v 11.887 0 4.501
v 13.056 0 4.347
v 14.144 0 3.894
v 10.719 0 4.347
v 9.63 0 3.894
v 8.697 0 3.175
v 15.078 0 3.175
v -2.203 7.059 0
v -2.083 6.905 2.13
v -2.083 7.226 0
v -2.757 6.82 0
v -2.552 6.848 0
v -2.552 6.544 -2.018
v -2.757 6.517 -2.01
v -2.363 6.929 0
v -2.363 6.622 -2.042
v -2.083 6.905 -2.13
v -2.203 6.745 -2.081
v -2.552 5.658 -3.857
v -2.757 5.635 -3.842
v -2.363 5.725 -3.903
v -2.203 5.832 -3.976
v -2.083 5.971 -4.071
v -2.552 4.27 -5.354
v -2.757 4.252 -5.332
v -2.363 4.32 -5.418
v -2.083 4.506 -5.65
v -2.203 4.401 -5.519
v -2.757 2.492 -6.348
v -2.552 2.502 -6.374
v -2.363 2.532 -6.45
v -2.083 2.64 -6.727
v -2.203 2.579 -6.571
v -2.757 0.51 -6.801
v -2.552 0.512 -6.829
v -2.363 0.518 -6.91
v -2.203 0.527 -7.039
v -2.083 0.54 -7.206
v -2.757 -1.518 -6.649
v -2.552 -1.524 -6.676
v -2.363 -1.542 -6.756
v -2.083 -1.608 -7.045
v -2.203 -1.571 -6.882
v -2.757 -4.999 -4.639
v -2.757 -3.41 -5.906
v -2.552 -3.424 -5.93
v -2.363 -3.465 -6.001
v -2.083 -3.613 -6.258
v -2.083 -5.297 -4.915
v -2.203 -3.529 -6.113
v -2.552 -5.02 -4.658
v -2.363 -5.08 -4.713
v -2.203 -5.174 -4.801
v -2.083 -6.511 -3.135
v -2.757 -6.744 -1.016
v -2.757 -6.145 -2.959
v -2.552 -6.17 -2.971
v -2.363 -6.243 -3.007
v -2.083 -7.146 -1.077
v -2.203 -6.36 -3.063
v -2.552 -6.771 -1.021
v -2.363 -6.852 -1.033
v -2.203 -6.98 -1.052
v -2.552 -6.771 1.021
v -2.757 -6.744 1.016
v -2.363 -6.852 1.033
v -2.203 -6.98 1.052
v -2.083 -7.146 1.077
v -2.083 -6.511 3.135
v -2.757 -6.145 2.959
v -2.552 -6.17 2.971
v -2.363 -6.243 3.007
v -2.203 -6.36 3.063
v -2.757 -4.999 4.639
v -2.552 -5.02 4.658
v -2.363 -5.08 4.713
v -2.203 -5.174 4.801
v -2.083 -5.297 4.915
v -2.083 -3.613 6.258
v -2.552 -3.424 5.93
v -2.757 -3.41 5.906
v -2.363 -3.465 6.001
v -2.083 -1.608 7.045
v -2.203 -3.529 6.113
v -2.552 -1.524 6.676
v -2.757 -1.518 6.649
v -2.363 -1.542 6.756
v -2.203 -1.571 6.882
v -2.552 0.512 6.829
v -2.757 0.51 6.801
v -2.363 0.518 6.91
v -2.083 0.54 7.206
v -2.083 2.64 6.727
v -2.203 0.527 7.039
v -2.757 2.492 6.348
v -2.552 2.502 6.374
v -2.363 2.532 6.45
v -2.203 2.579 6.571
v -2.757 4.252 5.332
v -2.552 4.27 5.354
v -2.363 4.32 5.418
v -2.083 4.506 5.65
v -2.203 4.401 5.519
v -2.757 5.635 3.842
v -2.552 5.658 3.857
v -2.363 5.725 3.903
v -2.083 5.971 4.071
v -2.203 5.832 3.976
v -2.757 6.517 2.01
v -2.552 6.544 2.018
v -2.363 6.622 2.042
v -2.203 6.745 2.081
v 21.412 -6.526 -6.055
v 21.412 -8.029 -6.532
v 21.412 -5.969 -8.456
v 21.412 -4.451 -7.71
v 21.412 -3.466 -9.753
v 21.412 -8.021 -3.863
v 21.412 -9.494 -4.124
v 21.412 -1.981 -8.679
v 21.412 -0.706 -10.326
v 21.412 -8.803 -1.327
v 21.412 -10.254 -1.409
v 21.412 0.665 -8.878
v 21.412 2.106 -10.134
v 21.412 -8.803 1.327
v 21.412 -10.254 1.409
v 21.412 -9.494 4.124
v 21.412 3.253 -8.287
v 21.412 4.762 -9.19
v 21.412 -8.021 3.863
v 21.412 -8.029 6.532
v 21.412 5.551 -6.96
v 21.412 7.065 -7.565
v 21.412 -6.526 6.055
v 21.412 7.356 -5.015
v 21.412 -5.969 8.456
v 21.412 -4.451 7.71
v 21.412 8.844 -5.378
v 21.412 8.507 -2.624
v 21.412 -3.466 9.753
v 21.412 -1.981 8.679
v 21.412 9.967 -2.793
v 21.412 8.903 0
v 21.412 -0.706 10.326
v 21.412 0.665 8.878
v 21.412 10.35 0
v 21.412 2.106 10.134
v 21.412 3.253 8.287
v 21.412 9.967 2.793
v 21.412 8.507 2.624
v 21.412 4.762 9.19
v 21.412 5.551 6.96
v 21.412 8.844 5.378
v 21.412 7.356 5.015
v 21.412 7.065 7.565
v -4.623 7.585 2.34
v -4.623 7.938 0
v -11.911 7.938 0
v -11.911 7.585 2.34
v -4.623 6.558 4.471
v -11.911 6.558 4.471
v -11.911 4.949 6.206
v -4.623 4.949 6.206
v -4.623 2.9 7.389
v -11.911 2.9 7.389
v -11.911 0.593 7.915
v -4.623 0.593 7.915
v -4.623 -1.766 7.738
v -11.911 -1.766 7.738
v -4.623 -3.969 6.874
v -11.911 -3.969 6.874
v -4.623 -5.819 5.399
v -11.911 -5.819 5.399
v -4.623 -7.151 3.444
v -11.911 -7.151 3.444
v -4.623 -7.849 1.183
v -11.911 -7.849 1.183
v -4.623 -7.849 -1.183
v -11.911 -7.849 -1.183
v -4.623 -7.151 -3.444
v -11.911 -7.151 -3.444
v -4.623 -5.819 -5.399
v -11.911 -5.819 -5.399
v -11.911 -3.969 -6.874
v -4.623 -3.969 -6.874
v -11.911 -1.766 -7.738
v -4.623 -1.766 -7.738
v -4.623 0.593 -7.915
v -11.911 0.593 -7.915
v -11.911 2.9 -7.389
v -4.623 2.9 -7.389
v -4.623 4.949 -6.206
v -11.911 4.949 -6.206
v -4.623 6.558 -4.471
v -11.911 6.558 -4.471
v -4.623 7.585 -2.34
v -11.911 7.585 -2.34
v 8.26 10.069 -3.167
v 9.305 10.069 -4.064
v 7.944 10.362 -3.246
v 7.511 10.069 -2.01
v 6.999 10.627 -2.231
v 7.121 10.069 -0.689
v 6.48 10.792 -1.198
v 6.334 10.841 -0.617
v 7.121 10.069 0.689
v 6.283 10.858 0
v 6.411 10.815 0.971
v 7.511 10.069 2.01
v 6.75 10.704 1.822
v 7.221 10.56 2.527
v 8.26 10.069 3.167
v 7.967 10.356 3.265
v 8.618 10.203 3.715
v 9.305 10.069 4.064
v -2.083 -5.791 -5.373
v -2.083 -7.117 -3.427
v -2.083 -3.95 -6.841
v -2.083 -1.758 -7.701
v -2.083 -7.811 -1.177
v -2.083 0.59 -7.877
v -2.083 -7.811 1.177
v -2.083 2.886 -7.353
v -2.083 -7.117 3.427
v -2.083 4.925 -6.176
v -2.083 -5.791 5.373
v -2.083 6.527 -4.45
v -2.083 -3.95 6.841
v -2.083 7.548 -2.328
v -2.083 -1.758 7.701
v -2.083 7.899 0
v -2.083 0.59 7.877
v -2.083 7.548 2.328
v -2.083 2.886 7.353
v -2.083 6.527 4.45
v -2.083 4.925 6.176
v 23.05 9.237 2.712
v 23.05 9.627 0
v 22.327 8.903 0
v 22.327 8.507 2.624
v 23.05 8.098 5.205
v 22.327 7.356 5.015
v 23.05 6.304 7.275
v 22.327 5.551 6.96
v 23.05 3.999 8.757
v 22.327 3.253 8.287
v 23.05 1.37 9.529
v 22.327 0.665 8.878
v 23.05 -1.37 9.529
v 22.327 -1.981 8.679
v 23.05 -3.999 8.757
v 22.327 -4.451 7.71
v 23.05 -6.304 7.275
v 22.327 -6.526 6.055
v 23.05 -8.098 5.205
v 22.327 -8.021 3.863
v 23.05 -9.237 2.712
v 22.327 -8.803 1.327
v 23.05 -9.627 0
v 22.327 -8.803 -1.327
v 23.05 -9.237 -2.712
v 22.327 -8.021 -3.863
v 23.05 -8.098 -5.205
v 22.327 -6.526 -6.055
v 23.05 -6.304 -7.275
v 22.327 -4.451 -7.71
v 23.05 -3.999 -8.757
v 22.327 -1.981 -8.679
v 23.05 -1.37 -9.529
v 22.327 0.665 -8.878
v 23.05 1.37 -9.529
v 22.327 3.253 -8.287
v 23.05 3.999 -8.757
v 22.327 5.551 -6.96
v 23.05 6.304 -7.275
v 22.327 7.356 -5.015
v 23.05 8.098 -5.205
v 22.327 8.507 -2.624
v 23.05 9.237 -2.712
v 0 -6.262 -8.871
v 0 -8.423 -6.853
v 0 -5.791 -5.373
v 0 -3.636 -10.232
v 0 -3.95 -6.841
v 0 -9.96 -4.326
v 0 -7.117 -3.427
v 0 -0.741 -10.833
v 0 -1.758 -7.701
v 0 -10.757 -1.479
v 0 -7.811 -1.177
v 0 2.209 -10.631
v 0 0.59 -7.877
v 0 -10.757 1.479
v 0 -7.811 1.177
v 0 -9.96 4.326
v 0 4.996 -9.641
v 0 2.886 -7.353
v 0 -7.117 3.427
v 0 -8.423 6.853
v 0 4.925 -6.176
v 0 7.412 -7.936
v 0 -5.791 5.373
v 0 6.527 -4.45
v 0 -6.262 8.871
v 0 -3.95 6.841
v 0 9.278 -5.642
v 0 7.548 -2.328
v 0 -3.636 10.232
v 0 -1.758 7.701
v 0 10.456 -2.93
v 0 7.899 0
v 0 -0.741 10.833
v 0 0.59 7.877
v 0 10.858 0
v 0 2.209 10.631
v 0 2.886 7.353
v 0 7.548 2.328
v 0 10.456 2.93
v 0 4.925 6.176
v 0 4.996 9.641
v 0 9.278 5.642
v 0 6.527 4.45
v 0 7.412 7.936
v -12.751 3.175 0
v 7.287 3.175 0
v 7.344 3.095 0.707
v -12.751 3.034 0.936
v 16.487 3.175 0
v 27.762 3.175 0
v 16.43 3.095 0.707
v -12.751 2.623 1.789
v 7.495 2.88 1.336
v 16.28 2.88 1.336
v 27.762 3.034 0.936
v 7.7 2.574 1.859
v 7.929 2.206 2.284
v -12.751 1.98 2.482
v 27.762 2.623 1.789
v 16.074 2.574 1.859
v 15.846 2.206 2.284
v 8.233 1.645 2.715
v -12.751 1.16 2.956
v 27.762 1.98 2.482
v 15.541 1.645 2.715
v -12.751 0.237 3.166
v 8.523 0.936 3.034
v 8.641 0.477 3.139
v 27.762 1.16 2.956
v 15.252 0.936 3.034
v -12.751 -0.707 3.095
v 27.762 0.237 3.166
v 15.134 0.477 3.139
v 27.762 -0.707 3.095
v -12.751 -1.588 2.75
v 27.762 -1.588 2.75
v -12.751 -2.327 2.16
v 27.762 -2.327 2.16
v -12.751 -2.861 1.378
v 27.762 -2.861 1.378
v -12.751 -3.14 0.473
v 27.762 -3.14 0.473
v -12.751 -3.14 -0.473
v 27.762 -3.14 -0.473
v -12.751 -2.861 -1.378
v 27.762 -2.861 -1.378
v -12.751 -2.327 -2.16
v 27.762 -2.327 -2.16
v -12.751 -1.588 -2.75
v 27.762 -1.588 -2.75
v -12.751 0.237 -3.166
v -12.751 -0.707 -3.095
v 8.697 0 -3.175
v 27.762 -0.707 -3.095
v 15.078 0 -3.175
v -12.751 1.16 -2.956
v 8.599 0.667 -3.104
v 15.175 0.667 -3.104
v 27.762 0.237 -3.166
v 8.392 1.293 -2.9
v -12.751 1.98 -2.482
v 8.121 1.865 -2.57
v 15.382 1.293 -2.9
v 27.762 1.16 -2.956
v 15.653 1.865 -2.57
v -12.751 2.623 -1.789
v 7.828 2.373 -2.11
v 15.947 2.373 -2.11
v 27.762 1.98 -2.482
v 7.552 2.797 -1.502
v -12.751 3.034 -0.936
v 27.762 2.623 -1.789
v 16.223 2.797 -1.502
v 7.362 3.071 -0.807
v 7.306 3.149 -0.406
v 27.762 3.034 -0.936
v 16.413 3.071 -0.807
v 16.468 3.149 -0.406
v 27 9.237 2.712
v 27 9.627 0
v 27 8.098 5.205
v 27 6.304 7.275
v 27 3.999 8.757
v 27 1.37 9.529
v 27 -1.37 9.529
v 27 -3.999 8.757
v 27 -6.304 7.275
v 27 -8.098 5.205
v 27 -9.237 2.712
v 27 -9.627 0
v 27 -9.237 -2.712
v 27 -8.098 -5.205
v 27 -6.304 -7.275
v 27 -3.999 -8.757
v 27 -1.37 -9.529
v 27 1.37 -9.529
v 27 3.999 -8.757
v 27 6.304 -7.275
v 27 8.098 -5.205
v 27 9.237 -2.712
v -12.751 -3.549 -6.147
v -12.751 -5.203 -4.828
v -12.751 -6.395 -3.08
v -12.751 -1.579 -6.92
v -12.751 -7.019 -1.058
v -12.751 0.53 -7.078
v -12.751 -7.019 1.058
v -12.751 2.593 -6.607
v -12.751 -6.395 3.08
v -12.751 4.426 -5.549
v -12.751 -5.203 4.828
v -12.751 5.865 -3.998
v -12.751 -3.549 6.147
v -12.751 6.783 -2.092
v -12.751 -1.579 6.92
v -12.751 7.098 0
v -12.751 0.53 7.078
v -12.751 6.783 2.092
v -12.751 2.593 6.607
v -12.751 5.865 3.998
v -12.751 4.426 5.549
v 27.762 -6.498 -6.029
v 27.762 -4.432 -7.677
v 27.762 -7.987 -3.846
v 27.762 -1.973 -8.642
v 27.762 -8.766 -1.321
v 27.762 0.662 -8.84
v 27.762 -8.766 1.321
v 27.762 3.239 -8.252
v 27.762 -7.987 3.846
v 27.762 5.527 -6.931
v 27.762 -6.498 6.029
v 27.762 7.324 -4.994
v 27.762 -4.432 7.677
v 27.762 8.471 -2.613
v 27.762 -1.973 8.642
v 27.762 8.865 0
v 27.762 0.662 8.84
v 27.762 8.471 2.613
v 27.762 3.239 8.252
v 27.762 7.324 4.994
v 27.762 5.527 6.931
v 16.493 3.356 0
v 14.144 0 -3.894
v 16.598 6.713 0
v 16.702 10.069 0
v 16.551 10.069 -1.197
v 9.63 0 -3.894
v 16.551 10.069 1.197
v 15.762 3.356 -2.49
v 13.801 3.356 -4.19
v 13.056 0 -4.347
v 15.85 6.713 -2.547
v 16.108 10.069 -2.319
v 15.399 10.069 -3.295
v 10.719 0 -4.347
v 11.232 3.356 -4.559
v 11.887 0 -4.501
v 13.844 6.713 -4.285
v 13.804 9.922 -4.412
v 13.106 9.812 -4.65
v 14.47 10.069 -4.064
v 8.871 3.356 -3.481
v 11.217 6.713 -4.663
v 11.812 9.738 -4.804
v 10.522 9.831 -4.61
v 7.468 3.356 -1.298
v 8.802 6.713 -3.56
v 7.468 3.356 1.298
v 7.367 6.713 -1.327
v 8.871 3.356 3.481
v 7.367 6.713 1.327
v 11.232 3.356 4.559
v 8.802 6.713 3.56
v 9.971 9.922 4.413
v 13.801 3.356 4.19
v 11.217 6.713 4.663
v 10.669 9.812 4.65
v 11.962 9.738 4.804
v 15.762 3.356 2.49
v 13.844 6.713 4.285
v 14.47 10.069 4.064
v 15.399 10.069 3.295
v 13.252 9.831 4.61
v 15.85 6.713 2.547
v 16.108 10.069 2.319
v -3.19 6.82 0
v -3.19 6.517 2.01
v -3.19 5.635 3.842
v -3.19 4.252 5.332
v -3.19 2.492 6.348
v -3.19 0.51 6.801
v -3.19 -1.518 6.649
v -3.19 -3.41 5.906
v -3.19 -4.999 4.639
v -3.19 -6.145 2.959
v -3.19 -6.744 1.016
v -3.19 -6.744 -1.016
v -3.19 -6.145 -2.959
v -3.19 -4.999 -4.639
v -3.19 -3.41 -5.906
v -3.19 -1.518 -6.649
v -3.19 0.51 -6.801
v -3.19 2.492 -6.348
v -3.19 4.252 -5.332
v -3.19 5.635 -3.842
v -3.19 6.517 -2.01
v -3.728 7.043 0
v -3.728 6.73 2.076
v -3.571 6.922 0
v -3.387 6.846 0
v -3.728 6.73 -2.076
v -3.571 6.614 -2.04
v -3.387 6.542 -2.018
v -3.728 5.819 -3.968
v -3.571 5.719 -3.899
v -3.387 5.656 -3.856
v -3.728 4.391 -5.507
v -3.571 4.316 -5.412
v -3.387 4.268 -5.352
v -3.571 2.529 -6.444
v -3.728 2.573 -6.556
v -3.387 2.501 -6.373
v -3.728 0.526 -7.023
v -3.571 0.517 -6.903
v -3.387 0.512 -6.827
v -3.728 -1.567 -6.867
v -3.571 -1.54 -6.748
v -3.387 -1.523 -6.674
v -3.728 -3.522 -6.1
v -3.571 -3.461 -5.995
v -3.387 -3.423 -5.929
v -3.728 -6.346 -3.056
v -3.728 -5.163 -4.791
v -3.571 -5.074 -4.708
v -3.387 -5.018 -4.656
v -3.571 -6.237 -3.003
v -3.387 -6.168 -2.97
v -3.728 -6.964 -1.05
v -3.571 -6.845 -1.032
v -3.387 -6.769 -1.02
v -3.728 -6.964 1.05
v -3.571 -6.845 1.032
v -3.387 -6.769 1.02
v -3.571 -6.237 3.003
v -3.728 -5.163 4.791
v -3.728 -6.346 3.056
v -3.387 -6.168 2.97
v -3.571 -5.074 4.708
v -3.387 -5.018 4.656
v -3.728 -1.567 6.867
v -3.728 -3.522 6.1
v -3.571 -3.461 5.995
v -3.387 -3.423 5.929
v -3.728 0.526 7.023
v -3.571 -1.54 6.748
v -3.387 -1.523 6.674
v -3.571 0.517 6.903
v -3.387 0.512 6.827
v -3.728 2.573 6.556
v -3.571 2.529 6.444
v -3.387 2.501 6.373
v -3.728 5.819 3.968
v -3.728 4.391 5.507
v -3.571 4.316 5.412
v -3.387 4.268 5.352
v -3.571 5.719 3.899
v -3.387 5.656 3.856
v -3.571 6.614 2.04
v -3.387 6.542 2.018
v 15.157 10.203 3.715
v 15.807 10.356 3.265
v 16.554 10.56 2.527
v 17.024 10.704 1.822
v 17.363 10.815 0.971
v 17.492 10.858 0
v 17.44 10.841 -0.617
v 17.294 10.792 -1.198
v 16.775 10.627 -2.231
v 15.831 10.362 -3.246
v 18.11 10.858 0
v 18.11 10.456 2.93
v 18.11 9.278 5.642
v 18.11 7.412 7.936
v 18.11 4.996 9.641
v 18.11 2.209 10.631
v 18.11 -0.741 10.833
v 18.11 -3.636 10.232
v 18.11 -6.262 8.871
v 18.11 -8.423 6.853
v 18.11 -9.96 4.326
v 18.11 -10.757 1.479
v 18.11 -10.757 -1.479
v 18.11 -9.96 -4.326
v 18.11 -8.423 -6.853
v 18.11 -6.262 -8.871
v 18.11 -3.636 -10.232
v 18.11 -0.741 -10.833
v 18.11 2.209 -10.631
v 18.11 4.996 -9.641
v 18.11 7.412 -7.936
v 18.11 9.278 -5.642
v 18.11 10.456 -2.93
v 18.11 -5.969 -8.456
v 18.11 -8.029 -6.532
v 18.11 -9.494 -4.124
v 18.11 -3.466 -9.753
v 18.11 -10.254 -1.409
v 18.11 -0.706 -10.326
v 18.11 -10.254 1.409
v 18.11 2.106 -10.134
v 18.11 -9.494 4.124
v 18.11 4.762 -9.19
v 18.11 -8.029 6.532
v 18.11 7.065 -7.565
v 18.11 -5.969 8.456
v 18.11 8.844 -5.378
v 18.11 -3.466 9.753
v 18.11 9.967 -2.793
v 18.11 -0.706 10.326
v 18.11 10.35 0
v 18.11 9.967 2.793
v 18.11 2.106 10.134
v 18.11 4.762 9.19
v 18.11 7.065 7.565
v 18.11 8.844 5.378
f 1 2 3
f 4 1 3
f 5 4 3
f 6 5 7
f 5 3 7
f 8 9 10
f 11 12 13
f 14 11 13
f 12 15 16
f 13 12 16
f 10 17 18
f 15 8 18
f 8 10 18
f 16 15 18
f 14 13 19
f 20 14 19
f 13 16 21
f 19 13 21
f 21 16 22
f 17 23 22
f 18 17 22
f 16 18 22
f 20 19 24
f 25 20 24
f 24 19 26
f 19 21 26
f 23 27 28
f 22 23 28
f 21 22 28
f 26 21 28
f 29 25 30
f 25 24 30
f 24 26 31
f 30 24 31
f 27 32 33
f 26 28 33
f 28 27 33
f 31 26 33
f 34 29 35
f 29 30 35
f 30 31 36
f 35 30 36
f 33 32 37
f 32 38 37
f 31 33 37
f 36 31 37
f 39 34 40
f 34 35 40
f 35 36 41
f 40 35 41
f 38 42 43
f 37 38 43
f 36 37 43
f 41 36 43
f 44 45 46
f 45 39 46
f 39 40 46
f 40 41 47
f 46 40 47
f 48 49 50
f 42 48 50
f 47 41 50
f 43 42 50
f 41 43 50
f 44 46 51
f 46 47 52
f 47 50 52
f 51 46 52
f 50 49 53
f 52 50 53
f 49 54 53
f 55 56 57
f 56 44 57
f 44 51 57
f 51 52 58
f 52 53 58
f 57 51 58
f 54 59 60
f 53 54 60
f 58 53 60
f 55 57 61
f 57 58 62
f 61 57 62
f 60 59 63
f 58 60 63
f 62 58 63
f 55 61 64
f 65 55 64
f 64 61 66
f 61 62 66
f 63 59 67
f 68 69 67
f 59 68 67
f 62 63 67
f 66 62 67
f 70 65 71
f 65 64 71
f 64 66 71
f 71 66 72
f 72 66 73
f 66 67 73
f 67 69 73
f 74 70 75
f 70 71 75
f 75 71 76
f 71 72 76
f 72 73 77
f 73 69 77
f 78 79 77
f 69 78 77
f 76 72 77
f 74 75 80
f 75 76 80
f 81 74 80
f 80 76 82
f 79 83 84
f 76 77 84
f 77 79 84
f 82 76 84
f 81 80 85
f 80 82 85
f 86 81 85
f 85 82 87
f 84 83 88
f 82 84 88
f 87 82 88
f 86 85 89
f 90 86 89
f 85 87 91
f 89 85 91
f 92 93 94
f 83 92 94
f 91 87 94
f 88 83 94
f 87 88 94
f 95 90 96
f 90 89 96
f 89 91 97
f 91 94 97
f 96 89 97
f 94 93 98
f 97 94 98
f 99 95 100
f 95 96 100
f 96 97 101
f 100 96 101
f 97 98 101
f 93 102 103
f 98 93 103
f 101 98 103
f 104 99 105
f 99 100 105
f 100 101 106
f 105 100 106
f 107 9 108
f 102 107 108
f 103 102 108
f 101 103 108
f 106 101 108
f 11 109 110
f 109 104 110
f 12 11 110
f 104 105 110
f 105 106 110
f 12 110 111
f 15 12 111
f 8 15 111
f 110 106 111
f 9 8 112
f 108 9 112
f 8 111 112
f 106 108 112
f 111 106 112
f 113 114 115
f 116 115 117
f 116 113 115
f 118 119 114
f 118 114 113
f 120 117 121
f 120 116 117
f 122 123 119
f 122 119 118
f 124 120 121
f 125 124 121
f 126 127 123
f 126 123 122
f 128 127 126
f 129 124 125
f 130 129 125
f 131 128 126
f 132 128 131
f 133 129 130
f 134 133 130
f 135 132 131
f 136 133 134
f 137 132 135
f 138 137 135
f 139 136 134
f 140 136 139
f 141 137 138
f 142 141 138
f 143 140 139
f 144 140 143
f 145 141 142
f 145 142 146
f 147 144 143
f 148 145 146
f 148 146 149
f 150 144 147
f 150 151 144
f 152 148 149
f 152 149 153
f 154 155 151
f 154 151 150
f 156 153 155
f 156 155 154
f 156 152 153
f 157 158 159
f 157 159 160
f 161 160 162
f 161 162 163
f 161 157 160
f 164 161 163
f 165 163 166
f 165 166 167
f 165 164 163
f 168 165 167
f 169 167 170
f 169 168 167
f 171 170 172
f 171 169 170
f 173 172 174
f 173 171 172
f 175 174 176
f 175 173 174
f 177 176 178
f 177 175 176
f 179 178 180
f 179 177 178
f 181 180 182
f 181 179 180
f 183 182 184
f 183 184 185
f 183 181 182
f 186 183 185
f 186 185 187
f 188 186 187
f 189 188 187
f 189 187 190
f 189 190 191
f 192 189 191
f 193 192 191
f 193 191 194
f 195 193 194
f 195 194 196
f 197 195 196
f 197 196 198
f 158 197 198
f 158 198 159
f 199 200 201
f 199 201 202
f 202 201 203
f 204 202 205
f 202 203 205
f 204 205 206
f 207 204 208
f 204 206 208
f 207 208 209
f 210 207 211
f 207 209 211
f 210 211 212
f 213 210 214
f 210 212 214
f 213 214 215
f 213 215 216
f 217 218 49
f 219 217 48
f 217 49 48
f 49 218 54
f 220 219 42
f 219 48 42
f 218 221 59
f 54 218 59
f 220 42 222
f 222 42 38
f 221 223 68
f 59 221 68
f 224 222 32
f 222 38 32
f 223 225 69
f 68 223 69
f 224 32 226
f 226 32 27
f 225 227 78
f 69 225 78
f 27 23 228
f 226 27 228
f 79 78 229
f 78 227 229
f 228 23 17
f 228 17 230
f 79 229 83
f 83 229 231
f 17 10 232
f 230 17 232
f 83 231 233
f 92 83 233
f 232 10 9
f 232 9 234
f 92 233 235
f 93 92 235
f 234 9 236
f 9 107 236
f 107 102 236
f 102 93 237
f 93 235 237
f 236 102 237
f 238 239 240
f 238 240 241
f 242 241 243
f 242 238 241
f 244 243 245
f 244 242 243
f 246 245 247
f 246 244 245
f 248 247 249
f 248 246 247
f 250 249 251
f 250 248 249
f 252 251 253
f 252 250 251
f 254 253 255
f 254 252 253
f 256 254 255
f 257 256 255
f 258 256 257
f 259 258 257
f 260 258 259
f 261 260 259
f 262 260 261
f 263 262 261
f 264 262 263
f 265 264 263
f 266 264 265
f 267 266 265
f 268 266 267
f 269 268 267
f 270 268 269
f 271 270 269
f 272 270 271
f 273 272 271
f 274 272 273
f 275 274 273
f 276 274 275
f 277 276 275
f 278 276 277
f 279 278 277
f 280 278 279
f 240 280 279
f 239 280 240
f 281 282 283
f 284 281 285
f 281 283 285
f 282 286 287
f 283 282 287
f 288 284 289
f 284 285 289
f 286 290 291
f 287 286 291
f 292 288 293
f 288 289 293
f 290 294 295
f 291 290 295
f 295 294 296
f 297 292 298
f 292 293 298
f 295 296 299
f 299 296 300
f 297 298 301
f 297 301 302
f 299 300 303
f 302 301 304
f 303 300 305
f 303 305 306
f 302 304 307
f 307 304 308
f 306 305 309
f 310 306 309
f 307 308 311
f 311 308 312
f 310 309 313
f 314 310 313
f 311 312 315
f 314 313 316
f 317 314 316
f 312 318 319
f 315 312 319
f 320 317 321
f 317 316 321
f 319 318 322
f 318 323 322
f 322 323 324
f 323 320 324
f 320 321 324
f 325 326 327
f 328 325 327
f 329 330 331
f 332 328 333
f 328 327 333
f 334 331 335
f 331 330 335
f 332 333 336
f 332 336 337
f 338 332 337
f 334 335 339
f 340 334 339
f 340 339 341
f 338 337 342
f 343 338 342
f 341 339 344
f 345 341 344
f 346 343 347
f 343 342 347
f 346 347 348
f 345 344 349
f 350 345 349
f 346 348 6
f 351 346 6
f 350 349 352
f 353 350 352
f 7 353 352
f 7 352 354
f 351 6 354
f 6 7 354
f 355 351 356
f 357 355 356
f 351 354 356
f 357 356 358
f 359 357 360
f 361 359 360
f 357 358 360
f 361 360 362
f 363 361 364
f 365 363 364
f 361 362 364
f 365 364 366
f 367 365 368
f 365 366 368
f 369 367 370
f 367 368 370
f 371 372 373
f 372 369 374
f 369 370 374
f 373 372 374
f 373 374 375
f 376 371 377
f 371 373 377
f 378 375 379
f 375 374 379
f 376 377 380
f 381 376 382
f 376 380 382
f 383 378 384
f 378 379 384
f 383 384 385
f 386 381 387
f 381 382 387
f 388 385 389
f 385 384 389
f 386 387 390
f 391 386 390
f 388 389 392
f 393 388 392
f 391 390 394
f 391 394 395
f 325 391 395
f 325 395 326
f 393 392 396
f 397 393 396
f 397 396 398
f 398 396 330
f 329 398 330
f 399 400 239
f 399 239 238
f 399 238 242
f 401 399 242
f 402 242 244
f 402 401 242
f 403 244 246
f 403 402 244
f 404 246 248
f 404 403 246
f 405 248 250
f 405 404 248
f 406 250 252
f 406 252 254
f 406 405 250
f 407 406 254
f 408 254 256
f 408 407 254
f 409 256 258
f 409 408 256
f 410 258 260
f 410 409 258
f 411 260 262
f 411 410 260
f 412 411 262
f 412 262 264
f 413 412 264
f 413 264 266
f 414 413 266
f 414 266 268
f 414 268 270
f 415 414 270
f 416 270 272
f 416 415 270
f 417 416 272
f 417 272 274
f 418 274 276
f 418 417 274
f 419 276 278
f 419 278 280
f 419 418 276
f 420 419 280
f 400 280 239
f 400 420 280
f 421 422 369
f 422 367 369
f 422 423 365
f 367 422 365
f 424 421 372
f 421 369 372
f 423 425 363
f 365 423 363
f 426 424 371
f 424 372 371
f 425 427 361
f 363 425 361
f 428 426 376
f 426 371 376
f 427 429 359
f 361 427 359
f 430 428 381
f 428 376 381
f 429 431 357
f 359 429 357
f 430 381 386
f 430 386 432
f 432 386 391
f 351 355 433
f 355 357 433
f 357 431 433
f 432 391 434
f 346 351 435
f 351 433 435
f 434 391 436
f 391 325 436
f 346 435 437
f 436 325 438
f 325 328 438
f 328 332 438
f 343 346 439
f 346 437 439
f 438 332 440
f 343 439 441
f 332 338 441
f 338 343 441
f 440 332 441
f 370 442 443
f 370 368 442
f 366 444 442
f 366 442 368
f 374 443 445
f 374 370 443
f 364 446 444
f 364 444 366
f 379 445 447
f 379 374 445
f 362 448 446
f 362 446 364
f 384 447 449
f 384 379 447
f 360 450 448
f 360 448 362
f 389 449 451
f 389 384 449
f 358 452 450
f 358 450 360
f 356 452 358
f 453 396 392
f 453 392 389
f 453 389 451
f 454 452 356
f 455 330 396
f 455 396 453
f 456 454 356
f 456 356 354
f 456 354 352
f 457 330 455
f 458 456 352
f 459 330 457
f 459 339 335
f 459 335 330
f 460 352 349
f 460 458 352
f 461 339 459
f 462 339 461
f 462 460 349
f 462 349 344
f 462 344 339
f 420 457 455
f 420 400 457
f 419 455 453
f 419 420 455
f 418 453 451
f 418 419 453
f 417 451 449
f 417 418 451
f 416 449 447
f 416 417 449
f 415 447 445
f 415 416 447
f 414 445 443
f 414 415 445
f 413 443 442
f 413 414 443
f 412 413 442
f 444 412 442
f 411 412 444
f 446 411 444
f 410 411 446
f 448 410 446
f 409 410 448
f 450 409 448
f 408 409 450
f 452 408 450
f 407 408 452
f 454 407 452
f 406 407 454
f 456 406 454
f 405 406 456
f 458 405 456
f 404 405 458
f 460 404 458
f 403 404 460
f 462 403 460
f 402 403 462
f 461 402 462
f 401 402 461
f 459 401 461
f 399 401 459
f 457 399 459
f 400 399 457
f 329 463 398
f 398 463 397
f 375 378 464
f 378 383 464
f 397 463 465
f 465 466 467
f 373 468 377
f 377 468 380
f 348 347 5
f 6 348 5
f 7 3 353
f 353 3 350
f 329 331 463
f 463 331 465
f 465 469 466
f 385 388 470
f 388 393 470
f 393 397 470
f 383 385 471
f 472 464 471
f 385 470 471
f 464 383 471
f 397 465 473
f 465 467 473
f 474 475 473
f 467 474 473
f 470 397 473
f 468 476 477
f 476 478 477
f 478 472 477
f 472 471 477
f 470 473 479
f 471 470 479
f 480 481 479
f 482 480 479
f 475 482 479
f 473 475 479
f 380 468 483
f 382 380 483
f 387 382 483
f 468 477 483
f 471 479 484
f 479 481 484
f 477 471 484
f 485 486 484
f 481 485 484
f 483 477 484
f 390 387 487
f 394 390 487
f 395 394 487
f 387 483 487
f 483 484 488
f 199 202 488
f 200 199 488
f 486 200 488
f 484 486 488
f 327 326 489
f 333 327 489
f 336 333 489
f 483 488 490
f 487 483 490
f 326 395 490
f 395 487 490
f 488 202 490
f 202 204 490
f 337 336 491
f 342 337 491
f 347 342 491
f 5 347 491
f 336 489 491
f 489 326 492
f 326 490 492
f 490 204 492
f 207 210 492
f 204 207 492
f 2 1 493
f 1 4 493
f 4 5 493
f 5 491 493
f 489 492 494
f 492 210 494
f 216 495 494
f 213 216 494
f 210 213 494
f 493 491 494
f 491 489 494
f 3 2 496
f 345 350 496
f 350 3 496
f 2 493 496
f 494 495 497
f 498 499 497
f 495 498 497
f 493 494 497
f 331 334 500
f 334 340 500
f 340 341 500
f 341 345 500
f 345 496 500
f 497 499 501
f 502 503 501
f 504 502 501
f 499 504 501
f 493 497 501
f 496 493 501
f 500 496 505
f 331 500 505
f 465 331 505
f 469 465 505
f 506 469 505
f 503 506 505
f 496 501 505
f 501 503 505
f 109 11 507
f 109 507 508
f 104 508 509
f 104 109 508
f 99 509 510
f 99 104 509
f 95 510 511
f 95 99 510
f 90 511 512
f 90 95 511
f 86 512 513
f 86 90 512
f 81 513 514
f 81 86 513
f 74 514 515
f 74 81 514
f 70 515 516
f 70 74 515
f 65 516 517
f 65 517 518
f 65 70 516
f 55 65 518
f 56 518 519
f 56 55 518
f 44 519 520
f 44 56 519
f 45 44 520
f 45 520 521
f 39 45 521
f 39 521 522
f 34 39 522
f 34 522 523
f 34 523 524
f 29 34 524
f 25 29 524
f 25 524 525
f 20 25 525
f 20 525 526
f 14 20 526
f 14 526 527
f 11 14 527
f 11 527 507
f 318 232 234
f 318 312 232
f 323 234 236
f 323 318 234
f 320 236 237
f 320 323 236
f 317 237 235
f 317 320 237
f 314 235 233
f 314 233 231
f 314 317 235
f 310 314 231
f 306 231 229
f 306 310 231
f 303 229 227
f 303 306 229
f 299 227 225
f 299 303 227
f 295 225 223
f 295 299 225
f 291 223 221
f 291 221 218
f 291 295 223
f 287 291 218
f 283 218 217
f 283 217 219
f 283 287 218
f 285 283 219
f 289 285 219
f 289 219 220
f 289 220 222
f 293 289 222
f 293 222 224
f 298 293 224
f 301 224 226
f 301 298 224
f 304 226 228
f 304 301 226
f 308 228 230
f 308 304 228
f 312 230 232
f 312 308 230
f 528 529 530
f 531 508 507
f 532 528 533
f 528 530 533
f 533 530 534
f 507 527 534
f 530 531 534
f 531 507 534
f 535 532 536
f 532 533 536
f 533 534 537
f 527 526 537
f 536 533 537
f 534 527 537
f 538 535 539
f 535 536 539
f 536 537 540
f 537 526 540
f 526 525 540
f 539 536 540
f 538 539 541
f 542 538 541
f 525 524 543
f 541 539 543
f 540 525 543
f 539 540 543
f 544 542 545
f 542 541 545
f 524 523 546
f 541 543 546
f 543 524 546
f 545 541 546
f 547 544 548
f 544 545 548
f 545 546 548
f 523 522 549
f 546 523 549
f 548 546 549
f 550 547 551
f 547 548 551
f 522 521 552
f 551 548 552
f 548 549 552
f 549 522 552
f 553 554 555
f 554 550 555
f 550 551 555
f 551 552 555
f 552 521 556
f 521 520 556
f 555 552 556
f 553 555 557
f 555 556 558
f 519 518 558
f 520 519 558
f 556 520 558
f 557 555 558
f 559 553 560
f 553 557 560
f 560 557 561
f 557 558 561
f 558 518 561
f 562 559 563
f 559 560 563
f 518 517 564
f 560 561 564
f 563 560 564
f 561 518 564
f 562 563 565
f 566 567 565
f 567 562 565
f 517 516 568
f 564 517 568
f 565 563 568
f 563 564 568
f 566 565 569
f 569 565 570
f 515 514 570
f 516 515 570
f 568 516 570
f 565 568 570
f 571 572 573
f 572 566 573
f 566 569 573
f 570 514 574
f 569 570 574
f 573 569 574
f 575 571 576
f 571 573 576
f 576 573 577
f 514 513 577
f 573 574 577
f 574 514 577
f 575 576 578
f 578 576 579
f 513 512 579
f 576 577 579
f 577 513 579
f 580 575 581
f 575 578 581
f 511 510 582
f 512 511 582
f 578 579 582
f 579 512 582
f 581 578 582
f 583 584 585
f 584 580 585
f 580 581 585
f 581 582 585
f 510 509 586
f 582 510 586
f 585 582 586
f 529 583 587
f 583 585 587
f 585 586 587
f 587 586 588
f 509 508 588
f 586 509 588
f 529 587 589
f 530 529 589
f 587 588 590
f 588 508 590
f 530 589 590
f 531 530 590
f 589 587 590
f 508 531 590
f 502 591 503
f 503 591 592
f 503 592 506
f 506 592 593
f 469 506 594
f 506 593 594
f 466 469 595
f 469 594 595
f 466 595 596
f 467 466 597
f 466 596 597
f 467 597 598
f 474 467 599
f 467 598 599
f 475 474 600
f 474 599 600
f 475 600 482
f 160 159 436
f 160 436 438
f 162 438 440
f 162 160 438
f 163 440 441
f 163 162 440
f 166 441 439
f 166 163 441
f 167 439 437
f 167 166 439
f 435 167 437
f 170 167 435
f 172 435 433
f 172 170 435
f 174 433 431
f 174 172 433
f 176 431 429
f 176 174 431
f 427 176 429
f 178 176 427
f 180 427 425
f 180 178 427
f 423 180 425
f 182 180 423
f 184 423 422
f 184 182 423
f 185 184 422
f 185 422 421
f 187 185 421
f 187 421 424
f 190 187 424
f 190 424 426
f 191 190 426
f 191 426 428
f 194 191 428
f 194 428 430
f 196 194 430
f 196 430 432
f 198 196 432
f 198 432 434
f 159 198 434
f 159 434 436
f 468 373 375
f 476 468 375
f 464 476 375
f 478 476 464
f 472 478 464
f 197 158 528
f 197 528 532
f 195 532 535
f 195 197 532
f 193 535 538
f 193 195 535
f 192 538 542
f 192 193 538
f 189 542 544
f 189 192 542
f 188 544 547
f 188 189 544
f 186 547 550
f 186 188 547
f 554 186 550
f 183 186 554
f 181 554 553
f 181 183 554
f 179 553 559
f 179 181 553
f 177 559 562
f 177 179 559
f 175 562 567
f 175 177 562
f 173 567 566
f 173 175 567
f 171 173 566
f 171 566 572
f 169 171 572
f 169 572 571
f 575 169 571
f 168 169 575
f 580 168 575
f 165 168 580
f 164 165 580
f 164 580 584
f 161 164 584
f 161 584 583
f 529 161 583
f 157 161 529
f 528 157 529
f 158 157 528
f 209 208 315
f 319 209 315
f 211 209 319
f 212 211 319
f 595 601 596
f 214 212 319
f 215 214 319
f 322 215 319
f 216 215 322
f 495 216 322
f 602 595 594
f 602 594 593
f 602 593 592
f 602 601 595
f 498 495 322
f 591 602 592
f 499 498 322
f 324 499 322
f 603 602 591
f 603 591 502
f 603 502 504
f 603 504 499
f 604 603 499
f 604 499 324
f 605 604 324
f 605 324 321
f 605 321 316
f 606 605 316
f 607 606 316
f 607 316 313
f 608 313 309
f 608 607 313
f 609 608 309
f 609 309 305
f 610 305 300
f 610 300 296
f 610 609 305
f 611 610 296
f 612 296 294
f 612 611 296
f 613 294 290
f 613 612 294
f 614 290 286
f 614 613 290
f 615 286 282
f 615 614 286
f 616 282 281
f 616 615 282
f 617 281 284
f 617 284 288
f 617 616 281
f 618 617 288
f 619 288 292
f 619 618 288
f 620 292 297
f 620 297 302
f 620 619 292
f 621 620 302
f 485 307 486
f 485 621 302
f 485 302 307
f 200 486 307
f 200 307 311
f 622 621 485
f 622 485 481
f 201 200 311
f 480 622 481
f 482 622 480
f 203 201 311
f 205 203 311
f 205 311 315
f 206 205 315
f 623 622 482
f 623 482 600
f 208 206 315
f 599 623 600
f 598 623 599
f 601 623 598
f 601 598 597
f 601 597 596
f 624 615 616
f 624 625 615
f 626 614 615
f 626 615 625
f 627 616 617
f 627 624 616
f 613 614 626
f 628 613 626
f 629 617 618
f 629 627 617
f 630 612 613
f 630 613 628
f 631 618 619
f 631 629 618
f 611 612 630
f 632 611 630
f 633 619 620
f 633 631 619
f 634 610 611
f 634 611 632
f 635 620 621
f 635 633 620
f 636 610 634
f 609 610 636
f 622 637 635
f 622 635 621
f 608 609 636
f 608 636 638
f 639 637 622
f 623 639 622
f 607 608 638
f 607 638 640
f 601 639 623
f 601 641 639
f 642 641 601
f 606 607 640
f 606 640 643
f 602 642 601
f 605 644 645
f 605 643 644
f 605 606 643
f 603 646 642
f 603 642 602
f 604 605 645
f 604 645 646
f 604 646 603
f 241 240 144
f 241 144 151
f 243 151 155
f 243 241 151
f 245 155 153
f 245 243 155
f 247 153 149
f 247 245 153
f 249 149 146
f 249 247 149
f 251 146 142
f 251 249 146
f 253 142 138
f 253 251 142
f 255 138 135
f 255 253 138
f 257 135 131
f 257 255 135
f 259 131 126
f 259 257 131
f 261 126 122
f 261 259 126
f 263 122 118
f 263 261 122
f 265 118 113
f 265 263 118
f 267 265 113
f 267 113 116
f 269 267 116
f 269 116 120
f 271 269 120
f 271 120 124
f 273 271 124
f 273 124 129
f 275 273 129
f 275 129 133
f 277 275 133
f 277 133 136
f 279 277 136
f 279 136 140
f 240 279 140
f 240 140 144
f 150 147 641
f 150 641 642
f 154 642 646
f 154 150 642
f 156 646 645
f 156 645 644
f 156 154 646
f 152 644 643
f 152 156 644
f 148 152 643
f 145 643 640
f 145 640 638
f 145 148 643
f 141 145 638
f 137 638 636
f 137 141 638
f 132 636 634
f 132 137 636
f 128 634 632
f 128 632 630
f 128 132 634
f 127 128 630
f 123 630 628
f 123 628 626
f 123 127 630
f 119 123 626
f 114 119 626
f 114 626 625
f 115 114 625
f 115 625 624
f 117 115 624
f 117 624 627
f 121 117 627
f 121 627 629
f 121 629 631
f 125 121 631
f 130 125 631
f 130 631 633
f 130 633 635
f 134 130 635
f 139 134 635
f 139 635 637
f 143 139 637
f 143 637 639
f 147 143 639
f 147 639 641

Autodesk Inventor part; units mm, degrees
sketch "Sketch_1" plane through (0, 0, 0) normal (0, 0, 1) x (1, 0, 0)
  line L0 (18.1102, 0) -> (0, 0)
  line L1 (0, 0) -> (0, 10.8585)
  line L2 (0, 10.8585) -> (18.1102, 10.8585)
  line L3 (18.1102, 10.8585) -> (18.1102, 0)
  line L4 (18.1102, 0) -> (0, 0)
revolve "Revolution1" add sketch "Sketch_1" angle 360 about axis through (18.1102, 0, 0) along (1, 0, 0)
sketch "Sketch_2" plane through (0, 0, 0) normal (0, 0, 1) x (1, 0, 0)
  line L0 (0, 0) -> (-12.7508, 0)
  line L1 (-12.7508, 0) -> (-12.7508, 7.098)
  line L2 (-12.7508, 7.098) -> (-11.9113, 7.9375)
  line L3 (-11.9113, 7.9375) -> (0, 7.9375)
  line L4 (0, 7.9375) -> (0, 0)
  line L5 (0, 0) -> (-12.7508, 0)
revolve "Revolution2" add sketch "Sketch_2" angle 360 about axis through (0, 0, 0) along (1, 0, 0)
thread "Thread1" size "5/8-18 UNF" class "2A" standard "ANSI Unified Screw Threads" length 7.2885
sketch "Sketch_6" plane through (0, 0, 0) normal (0, 0, 1) x (1, 0, 0)
  line L0 (27.7622, 0) -> (18.1102, 0)
  line L1 (18.1102, 0) -> (18.1102, 10.3505)
  line L2 (18.1102, 10.3505) -> (21.4122, 10.3505)
  line L3 (21.4122, 10.3505) -> (21.4122, 8.9027)
  line L4 (21.4122, 8.9027) -> (22.3266, 8.9027)
  line L5 (22.3266, 8.9027) -> (23.0505, 9.6266)
  line L6 (23.0505, 9.6266) -> (27.0002, 9.6266)
  line L7 (27.0002, 9.6266) -> (27.7622, 8.8646)
  line L8 (27.7622, 8.8646) -> (27.7622, 0)
  line L9 (27.7622, 0) -> (18.1102, 0)
revolve "Revolution3" add sketch "Sketch_6" angle 360 about axis through (27.7622, 0, 0) along (1, 0, 0)
sketch "Sketch_7" plane through (0, 0, 0) normal (1, 0, 0) x (0, 1, 0)
  circle A0 centre (0, 0) radius 3.175
extrude "Extrusion1" cut sketch "Sketch_7" along normal mid plane 111.0488
sketch "Sketch_8" plane through (11.8872, 0, 0) normal (0, 0, 1) x (0, -1, 0)
  line L0 (0, 0) -> (-11.7085, 0)
  line L1 (-11.7085, 0) -> (-11.7085, 6.4547)
  line L2 (-11.7085, 6.4547) -> (-10.0692, 4.8153)
  line L3 (-10.0692, 4.8153) -> (0, 4.501)
  line L4 (0, 4.501) -> (0, 0)
  line L5 (0, 0) -> (-11.7085, 0)
revolve "Revolution4" cut sketch "Sketch_8" angle 360 about axis through (11.8872, 0, 0) along (0, -1, 0)
sketch "Sketch_29" plane through (0, 0, 0) normal (0, 0, 1) x (1, 0, 0)
  line L0 (0, 0) -> (-4.6228, 0)
  line L1 (-4.6228, 9.8994) -> (-4.6228, 7.9375)
  line L2 (-4.6228, 7.9375) -> (-3.7284, 7.0431)
  arc A0 (-3.7284, 7.0431) -> (-3.1896, 6.8199) centre (-3.1896, 7.5819) ccw
  line L3 (-3.1896, 6.8199) -> (-2.7567, 6.8199)
  arc A1 (-2.7567, 6.8199) -> (-2.0828, 7.2263) centre (-2.7567, 7.5819) ccw
  line L4 (-2.0828, 7.2263) -> (-2.0828, 7.8994)
  line L5 (-2.0828, 7.8994) -> (0, 7.8994)
  line L6 (0, 7.8994) -> (0, 9.8994)
  line L7 (0, 9.8994) -> (-4.6228, 9.8994)
revolve "Revolution5" cut sketch "Sketch_29" angle 360 about axis through (0, 0, 0) along (1, 0, 0)
ref_plane "b1_XY" through (0, 7.8994, 0) normal (1, 0, 0) x (0, 0, -1)
ref_plane "b1_YZ" through (0, 7.8994, 0) normal (0, 0, -1) x (0, 1, 0)
ref_plane "b1_ZX" through (0, 7.8994, 0) normal (0, 1, 0) x (1, 0, 0)
ref_plane "b2_XY" through (0, -7.8994, 0) normal (1, 0, 0) x (0, 0, -1)
ref_plane "b2_YZ" through (0, -7.8994, 0) normal (0, 0, -1) x (0, 1, 0)
ref_plane "b2_ZX" through (0, -7.8994, 0) normal (0, 1, 0) x (1, 0, 0)
ref_plane "cl1_XY" through (0, 0, 0) normal (0, 0, 1) x (1, 0, 0)
ref_plane "cl1_YZ" through (0, 0, 0) normal (1, 0, 0) x (0, 1, 0)
ref_plane "cl1_ZX" through (0, 0, 0) normal (0, 1, 0) x (0, 0, 1)
ref_plane "cl2_XY" through (-2.0828, 0, 0) normal (0, 0, 1) x (1, 0, 0)
ref_plane "cl2_YZ" through (-2.0828, 0, 0) normal (1, 0, 0) x (0, 1, 0)
ref_plane "cl2_ZX" through (-2.0828, 0, 0) normal (0, 1, 0) x (0, 0, 1)
ref_plane "ee_XY" through (11.8872, 10.8585, 0) normal (1, 0, 0) x (0, -1, 0)
ref_plane "ee_YZ" through (11.8872, 10.8585, 0) normal (0, -1, 0) x (0, 0, -1)
ref_plane "ee_ZX" through (11.8872, 10.8585, 0) normal (0, 0, -1) x (1, 0, 0)
ref_plane "od1_XY" through (0, 0, 10.8585) normal (1, 0, 0) x (0, 0, -1)
ref_plane "od1_YZ" through (0, 0, 10.8585) normal (0, 0, -1) x (0, 1, 0)
ref_plane "od1_ZX" through (0, 0, 10.8585) normal (0, 1, 0) x (1, 0, 0)
ref_plane "od2_XY" through (0, 0, -10.8585) normal (1, 0, 0) x (0, 0, -1)
ref_plane "od2_YZ" through (0, 0, -10.8585) normal (0, 0, -1) x (0, 1, 0)
ref_plane "od2_ZX" through (0, 0, -10.8585) normal (0, 1, 0) x (1, 0, 0)
ref_plane "od3_XY" through (0, 10.8585, 0) normal (1, 0, 0) x (0, 0, -1)
ref_plane "od3_YZ" through (0, 10.8585, 0) normal (0, 0, -1) x (0, 1, 0)
ref_plane "od3_ZX" through (0, 10.8585, 0) normal (0, 1, 0) x (1, 0, 0)
ref_plane "od4_XY" through (0, -10.8585, 0) normal (1, 0, 0) x (0, 0, -1)
ref_plane "od4_YZ" through (0, -10.8585, 0) normal (0, 0, -1) x (0, 1, 0)
ref_plane "od4_ZX" through (0, -10.8585, 0) normal (0, 1, 0) x (1, 0, 0)
ref_plane "to_body_XY" through (21.4122, 0, 0) normal (1, 0, 0) x (0, 0, -1)
ref_plane "to_body_YZ" through (21.4122, 0, 0) normal (0, 0, -1) x (0, 1, 0)
ref_plane "to_body_ZX" through (21.4122, 0, 0) normal (0, 1, 0) x (1, 0, 0)
ref_plane "to_dummy_XY" through (0, 0, 0) normal (1, 0, 0) x (0, 0, -1)
ref_plane "to_dummy_YZ" through (0, 0, 0) normal (0, 0, -1) x (0, 1, 0)
ref_plane "to_dummy_ZX" through (0, 0, 0) normal (0, 1, 0) x (1, 0, 0)
ref_plane "to_nut_XY" through (-12.7508, 0, 0) normal (1, 0, 0) x (0, 0, -1)
ref_plane "to_nut_YZ" through (-12.7508, 0, 0) normal (0, 0, -1) x (0, 1, 0)
ref_plane "to_nut_ZX" through (-12.7508, 0, 0) normal (0, 1, 0) x (1, 0, 0)
ref_plane "to_stroke_adjuster_XY" through (27.7622, 0, 0) normal (1, 0, 0) x (0, 0, -1)
ref_plane "to_stroke_adjuster_YZ" through (27.7622, 0, 0) normal (0, 0, -1) x (0, 1, 0)
ref_plane "to_stroke_adjuster_ZX" through (27.7622, 0, 0) normal (0, 1, 0) x (1, 0, 0)
properties part number "0.75DXP-H_SRS1"
